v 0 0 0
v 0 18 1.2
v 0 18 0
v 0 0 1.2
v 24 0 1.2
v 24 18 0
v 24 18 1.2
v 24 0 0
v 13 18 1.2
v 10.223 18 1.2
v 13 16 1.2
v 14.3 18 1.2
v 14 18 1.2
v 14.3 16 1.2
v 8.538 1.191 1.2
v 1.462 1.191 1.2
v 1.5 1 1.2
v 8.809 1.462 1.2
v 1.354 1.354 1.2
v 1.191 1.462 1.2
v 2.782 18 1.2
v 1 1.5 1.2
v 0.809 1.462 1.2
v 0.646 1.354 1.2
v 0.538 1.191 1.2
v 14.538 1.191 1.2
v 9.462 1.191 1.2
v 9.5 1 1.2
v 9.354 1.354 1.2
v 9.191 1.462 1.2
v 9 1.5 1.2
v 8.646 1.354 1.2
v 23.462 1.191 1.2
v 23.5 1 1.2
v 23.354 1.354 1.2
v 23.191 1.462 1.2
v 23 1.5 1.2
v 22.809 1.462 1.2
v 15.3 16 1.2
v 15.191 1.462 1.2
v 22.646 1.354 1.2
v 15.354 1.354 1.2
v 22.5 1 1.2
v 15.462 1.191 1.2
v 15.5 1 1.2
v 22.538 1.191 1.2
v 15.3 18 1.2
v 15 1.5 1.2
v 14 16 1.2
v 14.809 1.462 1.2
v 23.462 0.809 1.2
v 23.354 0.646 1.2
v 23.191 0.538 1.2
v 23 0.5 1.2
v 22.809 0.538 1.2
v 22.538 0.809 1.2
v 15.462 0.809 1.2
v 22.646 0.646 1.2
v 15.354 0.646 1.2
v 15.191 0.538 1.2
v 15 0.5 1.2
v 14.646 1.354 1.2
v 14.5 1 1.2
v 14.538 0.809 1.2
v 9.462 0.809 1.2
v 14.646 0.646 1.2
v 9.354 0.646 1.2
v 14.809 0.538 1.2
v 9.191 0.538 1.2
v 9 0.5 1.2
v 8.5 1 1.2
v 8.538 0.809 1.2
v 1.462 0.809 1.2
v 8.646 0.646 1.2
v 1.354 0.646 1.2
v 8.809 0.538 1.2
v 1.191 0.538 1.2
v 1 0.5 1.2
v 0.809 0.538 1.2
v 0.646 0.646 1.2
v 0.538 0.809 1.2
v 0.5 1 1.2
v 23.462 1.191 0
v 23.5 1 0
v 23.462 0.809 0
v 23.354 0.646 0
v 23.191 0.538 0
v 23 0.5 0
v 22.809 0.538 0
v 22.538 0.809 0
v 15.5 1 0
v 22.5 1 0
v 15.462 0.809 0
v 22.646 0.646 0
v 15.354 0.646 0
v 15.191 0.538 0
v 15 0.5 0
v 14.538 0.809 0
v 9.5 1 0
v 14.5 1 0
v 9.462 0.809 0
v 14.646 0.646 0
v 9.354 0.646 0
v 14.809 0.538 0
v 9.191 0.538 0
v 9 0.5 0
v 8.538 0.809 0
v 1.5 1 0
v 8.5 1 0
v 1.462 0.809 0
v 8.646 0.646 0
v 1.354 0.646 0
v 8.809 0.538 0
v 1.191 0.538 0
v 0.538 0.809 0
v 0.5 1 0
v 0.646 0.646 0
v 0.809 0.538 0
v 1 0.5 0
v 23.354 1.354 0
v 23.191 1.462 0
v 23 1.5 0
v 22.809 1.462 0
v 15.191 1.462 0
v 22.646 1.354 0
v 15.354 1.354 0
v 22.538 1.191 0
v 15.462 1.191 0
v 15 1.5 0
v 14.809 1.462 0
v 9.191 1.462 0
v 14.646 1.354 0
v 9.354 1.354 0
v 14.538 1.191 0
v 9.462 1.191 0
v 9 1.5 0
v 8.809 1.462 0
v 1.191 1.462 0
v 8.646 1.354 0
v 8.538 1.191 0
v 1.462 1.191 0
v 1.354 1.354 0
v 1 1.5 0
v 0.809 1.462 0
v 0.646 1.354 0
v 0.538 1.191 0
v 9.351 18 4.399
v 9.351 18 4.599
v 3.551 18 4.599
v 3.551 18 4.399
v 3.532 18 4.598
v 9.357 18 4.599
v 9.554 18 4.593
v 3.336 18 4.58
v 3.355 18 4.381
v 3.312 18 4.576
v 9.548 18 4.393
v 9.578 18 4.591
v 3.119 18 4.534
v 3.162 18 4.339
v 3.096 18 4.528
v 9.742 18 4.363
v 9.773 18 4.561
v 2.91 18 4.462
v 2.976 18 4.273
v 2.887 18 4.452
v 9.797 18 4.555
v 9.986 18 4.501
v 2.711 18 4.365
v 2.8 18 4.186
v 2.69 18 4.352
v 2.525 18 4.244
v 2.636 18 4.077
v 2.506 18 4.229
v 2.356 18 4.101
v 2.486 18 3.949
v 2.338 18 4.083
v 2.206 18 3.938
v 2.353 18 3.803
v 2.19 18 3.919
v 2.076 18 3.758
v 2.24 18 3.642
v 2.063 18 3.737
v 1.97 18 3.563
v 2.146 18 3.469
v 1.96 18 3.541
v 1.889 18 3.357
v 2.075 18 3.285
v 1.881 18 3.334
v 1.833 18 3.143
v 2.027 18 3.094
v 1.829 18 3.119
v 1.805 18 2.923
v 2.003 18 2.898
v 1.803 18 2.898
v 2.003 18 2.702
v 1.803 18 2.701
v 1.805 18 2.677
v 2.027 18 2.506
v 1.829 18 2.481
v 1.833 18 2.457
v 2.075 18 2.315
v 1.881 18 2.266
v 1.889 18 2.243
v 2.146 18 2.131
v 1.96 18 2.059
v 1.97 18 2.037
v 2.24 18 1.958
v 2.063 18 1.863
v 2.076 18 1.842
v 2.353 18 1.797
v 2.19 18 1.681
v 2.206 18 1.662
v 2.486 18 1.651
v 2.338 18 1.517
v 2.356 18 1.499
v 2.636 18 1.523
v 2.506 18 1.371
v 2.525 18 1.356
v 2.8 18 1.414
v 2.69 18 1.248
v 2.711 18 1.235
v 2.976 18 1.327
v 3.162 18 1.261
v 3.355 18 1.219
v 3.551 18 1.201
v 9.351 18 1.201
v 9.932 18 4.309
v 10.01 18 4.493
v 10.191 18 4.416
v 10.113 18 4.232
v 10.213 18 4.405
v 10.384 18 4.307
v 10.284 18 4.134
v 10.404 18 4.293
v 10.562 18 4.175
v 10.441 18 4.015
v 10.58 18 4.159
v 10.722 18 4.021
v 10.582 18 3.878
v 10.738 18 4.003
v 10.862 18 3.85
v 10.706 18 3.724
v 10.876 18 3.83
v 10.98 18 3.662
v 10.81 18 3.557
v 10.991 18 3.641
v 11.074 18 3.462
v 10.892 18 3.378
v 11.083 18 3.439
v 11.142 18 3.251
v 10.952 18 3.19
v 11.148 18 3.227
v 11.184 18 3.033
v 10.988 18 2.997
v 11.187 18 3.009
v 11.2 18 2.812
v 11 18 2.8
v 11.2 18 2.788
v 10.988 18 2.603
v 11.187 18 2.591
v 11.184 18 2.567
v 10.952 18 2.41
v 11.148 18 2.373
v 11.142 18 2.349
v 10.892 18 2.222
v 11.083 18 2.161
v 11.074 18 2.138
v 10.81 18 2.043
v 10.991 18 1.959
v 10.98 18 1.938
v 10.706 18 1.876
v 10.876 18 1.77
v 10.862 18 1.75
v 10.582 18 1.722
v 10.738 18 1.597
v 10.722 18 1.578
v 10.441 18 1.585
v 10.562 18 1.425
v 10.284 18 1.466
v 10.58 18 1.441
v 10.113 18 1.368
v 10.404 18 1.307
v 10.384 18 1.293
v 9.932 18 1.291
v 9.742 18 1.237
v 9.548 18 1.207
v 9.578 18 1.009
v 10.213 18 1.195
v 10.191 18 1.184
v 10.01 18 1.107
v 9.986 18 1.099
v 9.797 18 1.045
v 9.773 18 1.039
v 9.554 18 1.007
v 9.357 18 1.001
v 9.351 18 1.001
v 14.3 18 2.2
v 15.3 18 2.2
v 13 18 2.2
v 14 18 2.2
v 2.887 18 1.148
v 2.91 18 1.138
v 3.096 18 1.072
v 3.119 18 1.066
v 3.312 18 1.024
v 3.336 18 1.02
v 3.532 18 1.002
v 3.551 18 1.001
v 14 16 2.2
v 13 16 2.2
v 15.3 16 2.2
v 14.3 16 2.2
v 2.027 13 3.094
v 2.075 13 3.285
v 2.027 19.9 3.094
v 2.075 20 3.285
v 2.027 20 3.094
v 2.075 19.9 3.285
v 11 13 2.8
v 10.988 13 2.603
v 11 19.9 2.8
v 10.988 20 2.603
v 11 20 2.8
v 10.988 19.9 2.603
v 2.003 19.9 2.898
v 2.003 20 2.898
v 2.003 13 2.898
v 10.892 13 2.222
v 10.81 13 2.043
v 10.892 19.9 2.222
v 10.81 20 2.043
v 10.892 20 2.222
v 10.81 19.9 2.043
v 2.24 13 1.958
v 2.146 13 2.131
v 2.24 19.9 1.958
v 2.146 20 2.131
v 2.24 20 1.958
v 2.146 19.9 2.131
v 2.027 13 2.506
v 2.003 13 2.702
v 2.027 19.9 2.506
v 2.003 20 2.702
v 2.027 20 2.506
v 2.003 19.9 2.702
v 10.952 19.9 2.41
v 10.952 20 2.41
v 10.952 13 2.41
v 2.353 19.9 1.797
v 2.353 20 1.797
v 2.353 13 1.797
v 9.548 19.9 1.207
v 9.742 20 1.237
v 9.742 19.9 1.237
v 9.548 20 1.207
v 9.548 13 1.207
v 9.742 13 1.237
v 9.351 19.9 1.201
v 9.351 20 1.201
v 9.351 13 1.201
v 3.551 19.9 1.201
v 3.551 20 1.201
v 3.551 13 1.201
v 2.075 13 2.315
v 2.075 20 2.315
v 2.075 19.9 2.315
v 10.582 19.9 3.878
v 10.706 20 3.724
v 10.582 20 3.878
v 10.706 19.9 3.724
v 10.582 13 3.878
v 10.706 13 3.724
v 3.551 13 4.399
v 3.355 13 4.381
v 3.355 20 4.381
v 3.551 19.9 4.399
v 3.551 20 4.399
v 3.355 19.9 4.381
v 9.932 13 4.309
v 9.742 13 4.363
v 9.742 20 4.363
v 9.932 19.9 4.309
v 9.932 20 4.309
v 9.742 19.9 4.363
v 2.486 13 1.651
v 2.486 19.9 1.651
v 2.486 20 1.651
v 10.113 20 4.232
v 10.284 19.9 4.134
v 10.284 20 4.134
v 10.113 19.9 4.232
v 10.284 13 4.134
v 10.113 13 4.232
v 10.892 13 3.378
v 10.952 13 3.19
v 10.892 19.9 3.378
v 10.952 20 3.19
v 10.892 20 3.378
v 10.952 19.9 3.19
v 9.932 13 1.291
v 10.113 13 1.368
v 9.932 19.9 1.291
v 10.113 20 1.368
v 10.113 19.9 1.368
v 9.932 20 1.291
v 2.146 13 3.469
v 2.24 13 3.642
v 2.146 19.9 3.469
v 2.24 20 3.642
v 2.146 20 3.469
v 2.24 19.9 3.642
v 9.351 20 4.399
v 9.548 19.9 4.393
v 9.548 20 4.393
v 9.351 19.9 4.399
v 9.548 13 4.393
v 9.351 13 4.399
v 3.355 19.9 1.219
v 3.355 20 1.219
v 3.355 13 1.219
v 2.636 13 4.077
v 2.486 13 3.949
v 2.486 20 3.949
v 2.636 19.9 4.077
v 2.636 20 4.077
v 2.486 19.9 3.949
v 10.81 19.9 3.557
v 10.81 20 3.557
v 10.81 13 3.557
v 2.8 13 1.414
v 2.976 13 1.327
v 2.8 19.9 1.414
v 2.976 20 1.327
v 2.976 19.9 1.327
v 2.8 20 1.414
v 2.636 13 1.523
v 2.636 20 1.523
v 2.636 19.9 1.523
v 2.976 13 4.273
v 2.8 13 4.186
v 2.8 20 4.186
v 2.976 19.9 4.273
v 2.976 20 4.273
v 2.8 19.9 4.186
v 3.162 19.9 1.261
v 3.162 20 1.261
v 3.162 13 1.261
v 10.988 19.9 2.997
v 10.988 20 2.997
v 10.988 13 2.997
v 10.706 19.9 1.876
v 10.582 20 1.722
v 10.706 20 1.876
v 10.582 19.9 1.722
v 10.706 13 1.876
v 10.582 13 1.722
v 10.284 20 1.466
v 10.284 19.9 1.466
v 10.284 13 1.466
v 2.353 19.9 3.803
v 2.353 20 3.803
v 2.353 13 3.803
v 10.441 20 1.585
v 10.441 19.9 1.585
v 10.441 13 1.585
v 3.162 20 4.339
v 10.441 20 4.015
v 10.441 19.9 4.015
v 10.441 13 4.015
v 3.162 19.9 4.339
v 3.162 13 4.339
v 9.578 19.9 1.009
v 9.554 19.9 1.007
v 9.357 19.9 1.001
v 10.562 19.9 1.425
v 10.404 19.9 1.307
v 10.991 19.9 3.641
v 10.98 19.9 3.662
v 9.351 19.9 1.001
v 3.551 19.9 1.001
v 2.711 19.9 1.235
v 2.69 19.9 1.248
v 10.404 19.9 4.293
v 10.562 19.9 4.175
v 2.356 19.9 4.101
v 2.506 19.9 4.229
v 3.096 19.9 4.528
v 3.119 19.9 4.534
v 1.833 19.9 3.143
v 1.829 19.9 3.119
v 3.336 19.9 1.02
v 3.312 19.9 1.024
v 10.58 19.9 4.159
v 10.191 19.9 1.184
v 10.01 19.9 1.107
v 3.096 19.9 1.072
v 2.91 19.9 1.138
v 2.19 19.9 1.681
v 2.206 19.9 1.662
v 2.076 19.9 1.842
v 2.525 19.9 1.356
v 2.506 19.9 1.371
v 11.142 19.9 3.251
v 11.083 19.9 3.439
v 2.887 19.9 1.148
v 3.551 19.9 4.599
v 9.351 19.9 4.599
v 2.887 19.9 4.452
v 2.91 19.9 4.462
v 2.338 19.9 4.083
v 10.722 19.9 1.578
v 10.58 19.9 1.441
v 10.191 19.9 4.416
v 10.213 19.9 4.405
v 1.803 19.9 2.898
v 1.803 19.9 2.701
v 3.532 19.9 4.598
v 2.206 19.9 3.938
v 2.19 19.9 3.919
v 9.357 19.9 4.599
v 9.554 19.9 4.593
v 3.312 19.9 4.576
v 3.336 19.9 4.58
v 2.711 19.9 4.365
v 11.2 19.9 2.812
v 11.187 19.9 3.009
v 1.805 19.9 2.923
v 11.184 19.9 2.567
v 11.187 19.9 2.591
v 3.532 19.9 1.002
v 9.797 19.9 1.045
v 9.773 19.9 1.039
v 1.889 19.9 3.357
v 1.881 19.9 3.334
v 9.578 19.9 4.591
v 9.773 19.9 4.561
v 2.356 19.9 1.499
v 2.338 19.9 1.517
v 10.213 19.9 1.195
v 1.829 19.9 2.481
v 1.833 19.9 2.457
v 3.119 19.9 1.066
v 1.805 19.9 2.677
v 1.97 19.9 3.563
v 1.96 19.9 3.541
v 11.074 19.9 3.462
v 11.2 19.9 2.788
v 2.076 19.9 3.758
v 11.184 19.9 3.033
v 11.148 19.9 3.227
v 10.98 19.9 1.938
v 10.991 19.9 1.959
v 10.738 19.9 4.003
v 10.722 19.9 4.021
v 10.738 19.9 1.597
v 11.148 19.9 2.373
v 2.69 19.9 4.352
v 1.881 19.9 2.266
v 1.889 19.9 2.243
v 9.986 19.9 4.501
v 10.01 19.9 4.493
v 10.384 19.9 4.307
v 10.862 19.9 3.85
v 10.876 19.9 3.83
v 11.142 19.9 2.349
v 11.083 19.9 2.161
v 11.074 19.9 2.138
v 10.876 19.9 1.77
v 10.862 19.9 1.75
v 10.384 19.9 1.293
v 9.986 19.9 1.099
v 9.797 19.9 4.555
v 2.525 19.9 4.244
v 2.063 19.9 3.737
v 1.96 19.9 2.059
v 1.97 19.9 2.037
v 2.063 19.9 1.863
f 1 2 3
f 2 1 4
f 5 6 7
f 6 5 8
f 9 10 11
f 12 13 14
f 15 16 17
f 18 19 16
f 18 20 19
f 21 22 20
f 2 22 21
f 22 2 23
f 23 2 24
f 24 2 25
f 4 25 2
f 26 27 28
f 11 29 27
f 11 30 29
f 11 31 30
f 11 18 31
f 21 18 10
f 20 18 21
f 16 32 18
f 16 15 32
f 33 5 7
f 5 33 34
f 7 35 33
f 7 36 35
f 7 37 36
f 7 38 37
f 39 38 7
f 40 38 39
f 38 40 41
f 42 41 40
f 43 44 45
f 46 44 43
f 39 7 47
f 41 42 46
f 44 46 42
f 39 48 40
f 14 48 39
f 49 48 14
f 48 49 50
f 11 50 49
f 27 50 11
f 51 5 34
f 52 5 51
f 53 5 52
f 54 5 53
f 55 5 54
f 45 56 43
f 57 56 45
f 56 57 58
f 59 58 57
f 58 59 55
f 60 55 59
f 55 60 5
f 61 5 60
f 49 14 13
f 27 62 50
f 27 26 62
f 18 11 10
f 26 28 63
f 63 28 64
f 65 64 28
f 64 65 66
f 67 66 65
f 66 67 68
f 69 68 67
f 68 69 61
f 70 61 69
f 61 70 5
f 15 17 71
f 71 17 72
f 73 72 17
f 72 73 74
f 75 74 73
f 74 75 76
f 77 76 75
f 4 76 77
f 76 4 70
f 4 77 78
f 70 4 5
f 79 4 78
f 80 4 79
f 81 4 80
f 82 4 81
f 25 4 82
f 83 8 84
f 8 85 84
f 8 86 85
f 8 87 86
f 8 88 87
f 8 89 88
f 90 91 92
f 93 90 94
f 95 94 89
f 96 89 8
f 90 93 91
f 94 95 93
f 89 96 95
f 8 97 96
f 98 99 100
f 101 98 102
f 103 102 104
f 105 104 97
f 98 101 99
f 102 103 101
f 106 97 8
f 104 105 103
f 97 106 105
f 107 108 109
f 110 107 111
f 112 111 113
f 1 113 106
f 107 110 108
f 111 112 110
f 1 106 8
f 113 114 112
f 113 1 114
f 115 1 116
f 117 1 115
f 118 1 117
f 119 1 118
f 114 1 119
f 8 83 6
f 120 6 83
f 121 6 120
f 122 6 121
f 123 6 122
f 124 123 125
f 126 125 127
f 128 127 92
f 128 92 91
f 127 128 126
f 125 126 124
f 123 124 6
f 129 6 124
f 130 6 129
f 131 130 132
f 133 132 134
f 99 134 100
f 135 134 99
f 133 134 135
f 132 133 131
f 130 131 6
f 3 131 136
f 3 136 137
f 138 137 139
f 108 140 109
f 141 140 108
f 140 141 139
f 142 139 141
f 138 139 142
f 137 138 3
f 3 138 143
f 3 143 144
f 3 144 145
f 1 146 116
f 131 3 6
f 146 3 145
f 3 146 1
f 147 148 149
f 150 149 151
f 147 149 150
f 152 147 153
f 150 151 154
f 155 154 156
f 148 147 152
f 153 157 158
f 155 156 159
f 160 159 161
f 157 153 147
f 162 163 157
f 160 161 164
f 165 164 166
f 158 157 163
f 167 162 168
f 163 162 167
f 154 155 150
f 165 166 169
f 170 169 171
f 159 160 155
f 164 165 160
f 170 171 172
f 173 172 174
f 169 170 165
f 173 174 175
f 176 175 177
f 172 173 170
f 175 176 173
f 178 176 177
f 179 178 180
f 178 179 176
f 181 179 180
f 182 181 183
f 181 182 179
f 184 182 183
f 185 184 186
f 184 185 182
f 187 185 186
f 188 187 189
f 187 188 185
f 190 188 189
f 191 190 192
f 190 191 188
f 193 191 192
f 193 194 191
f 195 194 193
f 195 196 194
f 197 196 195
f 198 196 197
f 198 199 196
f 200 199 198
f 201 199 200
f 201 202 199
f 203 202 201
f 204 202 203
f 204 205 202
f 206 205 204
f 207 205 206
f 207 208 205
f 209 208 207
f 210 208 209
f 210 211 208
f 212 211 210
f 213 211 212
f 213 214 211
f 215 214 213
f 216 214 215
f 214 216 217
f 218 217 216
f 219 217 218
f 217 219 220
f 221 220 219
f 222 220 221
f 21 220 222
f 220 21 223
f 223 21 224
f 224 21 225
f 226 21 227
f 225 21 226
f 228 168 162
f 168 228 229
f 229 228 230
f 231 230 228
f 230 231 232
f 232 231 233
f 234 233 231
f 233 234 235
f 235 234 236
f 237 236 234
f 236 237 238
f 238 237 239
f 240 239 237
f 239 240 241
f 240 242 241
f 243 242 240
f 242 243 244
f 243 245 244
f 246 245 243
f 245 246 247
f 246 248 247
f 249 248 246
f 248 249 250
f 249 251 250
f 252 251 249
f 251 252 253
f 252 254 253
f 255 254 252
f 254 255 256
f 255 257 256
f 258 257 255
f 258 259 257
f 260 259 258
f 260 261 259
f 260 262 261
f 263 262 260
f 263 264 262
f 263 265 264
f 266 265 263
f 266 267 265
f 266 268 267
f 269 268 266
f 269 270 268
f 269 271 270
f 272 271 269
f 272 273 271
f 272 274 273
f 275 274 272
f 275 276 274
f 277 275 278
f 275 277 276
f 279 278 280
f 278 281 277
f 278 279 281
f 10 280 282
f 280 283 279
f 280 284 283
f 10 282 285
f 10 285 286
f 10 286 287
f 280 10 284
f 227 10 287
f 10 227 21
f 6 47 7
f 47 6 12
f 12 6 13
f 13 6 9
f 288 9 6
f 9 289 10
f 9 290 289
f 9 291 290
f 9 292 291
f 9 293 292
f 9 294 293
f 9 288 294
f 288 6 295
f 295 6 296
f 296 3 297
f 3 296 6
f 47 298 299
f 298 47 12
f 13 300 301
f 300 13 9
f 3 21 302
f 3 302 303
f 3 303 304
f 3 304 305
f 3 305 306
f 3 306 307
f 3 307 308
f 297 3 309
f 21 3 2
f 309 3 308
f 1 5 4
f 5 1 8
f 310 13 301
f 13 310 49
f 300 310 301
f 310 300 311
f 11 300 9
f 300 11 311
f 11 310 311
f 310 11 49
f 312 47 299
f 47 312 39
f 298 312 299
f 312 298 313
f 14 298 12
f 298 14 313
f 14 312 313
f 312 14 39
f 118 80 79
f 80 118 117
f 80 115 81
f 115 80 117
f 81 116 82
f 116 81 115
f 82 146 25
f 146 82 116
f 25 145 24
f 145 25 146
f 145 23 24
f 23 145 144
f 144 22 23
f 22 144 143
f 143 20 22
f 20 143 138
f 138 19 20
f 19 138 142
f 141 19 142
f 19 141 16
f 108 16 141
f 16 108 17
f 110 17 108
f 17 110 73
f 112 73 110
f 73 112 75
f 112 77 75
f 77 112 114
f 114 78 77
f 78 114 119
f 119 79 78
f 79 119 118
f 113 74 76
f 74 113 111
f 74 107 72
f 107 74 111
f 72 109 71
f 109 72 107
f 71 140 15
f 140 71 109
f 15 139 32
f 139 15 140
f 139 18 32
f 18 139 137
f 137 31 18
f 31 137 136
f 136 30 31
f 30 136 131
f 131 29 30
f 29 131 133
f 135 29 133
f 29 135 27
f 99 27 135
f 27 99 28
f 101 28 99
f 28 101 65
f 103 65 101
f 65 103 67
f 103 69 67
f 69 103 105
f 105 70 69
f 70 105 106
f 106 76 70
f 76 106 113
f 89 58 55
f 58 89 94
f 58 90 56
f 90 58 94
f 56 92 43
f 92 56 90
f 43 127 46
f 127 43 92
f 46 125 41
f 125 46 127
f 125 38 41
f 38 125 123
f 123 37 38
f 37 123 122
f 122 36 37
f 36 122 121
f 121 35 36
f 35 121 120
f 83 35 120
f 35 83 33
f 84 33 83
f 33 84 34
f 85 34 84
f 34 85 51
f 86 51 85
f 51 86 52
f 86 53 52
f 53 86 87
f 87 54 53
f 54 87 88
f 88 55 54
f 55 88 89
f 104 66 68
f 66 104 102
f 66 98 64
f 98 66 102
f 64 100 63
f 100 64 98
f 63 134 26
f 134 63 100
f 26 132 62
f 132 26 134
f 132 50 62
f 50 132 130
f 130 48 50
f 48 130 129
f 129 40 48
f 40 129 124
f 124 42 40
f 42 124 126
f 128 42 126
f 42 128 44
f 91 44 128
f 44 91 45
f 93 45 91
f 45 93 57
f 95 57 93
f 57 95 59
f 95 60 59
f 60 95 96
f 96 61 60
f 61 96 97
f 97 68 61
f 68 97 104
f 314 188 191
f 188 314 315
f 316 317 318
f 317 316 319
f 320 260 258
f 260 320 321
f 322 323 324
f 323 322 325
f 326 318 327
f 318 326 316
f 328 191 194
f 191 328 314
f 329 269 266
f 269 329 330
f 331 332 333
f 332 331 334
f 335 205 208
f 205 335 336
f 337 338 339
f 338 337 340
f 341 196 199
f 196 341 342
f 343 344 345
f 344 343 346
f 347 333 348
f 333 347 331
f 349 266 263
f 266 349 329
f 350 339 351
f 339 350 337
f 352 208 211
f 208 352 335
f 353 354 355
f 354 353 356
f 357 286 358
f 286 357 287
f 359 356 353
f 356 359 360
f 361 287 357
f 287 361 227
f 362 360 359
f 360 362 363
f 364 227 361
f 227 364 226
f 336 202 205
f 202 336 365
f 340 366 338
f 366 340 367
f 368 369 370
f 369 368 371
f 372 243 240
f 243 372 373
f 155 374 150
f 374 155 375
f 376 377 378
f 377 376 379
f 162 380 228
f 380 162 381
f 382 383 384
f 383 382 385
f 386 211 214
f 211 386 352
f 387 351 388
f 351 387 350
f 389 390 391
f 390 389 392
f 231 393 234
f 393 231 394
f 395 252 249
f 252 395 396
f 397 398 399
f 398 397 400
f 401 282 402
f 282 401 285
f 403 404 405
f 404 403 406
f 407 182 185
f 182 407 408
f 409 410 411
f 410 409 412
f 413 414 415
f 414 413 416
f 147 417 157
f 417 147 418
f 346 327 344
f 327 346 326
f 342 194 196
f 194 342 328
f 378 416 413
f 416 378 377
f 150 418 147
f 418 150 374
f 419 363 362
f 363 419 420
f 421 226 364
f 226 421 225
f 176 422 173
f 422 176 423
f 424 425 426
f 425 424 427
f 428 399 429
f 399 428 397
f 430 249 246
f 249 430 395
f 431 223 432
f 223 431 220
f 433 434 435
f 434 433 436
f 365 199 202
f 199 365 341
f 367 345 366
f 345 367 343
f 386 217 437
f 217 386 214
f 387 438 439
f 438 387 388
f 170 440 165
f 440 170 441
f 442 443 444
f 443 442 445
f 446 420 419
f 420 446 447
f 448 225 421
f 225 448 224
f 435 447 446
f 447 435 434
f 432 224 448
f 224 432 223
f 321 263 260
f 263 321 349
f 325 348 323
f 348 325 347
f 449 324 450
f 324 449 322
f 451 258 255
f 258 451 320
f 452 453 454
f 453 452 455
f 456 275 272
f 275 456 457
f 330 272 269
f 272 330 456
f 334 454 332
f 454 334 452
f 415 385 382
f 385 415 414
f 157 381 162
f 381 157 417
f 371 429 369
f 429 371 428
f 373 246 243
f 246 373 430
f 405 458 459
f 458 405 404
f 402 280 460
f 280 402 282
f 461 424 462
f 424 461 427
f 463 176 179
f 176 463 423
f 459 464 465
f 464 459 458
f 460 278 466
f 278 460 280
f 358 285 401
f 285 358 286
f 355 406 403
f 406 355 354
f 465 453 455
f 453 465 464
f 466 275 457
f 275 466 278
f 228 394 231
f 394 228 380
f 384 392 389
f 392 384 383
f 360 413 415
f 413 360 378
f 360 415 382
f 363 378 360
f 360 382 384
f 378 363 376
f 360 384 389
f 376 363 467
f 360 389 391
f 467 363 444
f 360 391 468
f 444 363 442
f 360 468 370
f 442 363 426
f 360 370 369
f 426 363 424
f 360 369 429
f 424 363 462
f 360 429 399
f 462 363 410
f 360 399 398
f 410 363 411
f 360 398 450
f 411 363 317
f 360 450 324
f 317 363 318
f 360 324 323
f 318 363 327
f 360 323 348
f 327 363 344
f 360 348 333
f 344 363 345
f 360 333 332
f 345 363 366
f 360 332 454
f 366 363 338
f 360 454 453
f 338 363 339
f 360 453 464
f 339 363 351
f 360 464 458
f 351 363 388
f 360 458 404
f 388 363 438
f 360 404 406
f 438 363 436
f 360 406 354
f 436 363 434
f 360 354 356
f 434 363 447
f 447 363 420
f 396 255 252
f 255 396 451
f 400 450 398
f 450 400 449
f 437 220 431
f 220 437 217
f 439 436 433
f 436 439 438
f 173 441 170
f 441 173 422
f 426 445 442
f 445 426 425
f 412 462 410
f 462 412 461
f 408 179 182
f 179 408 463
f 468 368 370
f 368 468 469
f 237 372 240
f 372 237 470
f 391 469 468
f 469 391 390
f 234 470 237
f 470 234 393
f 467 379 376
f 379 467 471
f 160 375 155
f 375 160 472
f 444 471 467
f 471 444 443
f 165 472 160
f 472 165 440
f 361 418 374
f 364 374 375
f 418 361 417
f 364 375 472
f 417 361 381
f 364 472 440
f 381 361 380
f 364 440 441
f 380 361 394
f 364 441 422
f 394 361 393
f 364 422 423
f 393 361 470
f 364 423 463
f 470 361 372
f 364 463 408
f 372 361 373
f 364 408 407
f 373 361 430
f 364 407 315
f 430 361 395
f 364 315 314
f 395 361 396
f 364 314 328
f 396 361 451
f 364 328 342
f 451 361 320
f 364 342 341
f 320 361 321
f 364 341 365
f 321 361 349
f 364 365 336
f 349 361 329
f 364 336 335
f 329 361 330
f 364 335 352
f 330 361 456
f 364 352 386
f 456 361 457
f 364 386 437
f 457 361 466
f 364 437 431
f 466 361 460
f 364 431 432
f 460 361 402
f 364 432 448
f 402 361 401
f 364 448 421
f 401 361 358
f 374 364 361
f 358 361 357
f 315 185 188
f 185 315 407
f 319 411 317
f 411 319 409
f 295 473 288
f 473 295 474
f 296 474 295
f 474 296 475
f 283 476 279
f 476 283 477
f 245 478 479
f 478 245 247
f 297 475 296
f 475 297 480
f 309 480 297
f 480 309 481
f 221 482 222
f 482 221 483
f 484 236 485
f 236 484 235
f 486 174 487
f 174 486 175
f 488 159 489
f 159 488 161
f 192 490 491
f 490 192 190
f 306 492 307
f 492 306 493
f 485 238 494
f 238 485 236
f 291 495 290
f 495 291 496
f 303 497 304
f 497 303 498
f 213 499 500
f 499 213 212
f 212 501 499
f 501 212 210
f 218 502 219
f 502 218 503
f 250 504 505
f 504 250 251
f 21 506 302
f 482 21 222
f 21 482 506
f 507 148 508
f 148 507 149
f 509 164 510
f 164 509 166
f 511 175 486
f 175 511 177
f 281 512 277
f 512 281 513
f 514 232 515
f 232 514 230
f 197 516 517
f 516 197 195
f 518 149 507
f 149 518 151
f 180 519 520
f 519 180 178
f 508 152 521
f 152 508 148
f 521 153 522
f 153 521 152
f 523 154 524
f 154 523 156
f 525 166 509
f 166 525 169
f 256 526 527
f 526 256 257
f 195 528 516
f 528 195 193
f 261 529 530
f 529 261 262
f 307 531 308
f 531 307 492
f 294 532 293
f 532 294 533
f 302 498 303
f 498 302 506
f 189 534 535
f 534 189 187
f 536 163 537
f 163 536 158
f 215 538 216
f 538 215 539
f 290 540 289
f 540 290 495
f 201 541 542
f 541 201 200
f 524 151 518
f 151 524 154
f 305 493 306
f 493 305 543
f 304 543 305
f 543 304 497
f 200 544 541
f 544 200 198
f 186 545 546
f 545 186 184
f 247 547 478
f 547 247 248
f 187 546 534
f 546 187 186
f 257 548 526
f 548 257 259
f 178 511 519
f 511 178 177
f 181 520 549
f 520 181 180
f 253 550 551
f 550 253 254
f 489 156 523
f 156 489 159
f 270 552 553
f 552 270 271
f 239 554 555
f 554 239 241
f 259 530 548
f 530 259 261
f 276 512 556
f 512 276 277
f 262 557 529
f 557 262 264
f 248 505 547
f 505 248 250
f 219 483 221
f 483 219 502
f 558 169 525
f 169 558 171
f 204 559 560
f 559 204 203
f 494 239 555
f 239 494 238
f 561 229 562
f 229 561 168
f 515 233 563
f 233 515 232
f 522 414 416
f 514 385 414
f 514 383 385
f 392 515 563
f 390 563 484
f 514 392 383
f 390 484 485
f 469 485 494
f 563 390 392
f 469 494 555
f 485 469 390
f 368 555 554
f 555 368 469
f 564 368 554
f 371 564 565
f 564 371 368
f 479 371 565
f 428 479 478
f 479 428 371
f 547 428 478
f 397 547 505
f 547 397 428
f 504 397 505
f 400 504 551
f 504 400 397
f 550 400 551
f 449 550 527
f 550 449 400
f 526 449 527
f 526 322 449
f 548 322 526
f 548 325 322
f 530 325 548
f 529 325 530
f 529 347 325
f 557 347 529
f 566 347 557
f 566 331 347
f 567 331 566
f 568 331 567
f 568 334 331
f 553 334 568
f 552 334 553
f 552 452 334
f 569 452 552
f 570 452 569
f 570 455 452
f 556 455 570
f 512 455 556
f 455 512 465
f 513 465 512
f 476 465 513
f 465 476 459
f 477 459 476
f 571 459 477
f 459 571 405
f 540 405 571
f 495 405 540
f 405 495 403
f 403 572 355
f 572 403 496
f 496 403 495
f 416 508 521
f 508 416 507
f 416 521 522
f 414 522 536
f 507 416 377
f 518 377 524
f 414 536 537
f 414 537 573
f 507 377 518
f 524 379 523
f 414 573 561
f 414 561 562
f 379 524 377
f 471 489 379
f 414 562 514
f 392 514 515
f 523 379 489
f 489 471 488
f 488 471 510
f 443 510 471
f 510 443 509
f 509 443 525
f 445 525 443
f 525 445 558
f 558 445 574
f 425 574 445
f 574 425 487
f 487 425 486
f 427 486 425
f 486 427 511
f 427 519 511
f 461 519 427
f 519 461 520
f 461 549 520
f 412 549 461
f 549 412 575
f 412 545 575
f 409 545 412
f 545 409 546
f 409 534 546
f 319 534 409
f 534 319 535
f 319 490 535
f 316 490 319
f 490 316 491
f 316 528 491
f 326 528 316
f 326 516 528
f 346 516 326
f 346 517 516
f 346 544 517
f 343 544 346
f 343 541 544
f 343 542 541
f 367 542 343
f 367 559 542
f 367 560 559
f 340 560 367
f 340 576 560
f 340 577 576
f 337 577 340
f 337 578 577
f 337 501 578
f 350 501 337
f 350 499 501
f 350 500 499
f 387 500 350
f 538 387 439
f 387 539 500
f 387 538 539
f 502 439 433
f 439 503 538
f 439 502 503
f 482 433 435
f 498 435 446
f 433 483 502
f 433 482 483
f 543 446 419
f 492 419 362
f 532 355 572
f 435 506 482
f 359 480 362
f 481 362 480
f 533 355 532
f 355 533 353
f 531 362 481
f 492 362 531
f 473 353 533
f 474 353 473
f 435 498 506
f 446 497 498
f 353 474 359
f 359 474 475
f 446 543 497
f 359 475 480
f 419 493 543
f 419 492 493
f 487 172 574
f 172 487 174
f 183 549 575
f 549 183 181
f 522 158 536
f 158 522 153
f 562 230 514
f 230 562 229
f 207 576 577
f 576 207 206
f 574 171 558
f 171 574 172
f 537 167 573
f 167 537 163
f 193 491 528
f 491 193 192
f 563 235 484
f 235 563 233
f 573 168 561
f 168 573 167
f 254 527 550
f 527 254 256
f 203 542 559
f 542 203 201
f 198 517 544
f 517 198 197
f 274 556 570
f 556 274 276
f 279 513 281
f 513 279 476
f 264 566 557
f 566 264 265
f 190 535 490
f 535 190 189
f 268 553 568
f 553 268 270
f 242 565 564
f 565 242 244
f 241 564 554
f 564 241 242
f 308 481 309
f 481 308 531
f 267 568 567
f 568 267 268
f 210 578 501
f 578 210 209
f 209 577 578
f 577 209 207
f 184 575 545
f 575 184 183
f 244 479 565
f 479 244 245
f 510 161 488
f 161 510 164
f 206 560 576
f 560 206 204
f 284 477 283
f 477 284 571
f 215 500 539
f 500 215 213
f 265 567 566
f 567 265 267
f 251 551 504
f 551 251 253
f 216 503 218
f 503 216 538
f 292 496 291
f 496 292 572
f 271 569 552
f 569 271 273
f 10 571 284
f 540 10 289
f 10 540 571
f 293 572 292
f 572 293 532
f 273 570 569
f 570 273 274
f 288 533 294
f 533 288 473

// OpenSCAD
use <bendlib.scad>;

function cms4056t(
    board_dim = undef,
    typec_dim = undef,
    typec_offset = undef,
    led_dim = undef,
    led_offsets = undef,
    pad_dim = undef,
    pad_hole_dia = undef,
    pad_offsets = undef
) = let(
    board_dim = bl_def(board_dim, [24, 18, 1.2]),
    typec_dim = bl_def(typec_dim, [9, 7, 3.2]),
    dim = board_dim + [0,0,typec_dim[2]],
    typec_offset = bl_def(typec_offset, [2, board_dim[1] - typec_dim[1] + 2, board_dim[2]]),
    led_dim = bl_def(led_dim, [1,2,1]),
    led_offsets = bl_def(led_offsets, [
        [13, board_dim[1]-led_dim[1], board_dim[2]],
        [14.3, board_dim[1]-led_dim[1], board_dim[2]]
    ]),
    pad_dim = bl_def(pad_dim, [2,2]),
    pad_hole_dia = bl_def(pad_hole_dia, 1),
    pad_offsets = bl_def(pad_offsets, [
        [0,0], 
        [8,0], 
        [board_dim[0]-pad_dim[0], 0], 
        [board_dim[0]-pad_dim[0] - 8, 0]
    ])
) [
    board_dim,
    typec_dim,
    dim,
    typec_offset,
    led_dim,
    led_offsets,
    pad_dim,
    pad_hole_dia,
    pad_offsets
];

function cms4056t_board_dim(type = cms4056t()) = type[0];
function cms4056t_typec_dim(type = cms4056t()) = type[1];
function cms4056t_dim(type = cms4056t()) = type[2];
function cms4056t_typec_offset(type = cms4056t()) = type[3];
function cms4056t_led_dim(type = cms4056t()) = type[4];
function cms4056t_led_offsets(type = cms4056t()) = type[5];
function cms4056t_pad_dim(type = cms4056t()) = type[6];
function cms4056t_pad_hole_dia(type = cms4056t()) = type[7];
function cms4056t_pad_offsets(type = cms4056t()) = type[8];

module cms4056t_typec_shape(type) {
    typec_dim = cms4056t_typec_dim(type);
    bl_hull_circle(typec_dim[2], typec_dim[0]);
}

module cms4056t_typec_diff(type, thickness, tolerance, axial_tolerance = undef, board_offset = undef) {
    axial_tolerance = bl_def(axial_tolerance, tolerance);
    board_offset = bl_def(board_offset, axial_tolerance);
    
    typec_offset = cms4056t_typec_offset(type);
    board_dim = cms4056t_board_dim(type);
    
    translate([typec_offset[0], board_dim[1] + board_offset, typec_offset[2]])
    rotate([90,0,0])
    translate([0,0,-thickness-axial_tolerance])
    linear_extrude(thickness + axial_tolerance*2)
    offset(tolerance)
    cms4056t_typec_shape(type);
}

module cms4056t(type = cms4056t()) {
    
    board_dim = cms4056t_board_dim(type);
    typec_dim = cms4056t_typec_dim(type);
    typec_offset = cms4056t_typec_offset(type);
    led_dim = cms4056t_led_dim(type);
    led_offsets = cms4056t_led_offsets(type);
    pad_dim = cms4056t_pad_dim(type);
    pad_hole_dia = cms4056t_pad_hole_dia(type);
    pad_offsets = cms4056t_pad_offsets(type);

    color("black")
    difference() {
        cube(board_dim);
        translate([0,-1,-1])
        for (off = pad_offsets) {
            translate(off)
            cube([pad_dim[0], pad_dim[1]+1, board_dim[2]+2]);
        }
    }
    
    translate(typec_offset)
    translate([0,0,typec_dim[2]])
    rotate([-90,0,0])
    linear_extrude(typec_dim[1])
    cms4056t_typec_shape(type);
    
    color("blue")
    for (off = led_offsets) {
        translate(off)
        cube(led_dim);
    }
    
    color("lightgray")
    for (off = pad_offsets) {
        translate(off)
        linear_extrude(board_dim[2])
        translate(pad_dim/2)
        difference() {
            square(pad_dim, center=true);
            circle(d = pad_hole_dia);
        }
    }

}

$fa = 0.2;
$fs = 0.2;
cms4056t(cms4056t());

#cms4056t_typec_diff(cms4056t(), 1.5, 0.2);
